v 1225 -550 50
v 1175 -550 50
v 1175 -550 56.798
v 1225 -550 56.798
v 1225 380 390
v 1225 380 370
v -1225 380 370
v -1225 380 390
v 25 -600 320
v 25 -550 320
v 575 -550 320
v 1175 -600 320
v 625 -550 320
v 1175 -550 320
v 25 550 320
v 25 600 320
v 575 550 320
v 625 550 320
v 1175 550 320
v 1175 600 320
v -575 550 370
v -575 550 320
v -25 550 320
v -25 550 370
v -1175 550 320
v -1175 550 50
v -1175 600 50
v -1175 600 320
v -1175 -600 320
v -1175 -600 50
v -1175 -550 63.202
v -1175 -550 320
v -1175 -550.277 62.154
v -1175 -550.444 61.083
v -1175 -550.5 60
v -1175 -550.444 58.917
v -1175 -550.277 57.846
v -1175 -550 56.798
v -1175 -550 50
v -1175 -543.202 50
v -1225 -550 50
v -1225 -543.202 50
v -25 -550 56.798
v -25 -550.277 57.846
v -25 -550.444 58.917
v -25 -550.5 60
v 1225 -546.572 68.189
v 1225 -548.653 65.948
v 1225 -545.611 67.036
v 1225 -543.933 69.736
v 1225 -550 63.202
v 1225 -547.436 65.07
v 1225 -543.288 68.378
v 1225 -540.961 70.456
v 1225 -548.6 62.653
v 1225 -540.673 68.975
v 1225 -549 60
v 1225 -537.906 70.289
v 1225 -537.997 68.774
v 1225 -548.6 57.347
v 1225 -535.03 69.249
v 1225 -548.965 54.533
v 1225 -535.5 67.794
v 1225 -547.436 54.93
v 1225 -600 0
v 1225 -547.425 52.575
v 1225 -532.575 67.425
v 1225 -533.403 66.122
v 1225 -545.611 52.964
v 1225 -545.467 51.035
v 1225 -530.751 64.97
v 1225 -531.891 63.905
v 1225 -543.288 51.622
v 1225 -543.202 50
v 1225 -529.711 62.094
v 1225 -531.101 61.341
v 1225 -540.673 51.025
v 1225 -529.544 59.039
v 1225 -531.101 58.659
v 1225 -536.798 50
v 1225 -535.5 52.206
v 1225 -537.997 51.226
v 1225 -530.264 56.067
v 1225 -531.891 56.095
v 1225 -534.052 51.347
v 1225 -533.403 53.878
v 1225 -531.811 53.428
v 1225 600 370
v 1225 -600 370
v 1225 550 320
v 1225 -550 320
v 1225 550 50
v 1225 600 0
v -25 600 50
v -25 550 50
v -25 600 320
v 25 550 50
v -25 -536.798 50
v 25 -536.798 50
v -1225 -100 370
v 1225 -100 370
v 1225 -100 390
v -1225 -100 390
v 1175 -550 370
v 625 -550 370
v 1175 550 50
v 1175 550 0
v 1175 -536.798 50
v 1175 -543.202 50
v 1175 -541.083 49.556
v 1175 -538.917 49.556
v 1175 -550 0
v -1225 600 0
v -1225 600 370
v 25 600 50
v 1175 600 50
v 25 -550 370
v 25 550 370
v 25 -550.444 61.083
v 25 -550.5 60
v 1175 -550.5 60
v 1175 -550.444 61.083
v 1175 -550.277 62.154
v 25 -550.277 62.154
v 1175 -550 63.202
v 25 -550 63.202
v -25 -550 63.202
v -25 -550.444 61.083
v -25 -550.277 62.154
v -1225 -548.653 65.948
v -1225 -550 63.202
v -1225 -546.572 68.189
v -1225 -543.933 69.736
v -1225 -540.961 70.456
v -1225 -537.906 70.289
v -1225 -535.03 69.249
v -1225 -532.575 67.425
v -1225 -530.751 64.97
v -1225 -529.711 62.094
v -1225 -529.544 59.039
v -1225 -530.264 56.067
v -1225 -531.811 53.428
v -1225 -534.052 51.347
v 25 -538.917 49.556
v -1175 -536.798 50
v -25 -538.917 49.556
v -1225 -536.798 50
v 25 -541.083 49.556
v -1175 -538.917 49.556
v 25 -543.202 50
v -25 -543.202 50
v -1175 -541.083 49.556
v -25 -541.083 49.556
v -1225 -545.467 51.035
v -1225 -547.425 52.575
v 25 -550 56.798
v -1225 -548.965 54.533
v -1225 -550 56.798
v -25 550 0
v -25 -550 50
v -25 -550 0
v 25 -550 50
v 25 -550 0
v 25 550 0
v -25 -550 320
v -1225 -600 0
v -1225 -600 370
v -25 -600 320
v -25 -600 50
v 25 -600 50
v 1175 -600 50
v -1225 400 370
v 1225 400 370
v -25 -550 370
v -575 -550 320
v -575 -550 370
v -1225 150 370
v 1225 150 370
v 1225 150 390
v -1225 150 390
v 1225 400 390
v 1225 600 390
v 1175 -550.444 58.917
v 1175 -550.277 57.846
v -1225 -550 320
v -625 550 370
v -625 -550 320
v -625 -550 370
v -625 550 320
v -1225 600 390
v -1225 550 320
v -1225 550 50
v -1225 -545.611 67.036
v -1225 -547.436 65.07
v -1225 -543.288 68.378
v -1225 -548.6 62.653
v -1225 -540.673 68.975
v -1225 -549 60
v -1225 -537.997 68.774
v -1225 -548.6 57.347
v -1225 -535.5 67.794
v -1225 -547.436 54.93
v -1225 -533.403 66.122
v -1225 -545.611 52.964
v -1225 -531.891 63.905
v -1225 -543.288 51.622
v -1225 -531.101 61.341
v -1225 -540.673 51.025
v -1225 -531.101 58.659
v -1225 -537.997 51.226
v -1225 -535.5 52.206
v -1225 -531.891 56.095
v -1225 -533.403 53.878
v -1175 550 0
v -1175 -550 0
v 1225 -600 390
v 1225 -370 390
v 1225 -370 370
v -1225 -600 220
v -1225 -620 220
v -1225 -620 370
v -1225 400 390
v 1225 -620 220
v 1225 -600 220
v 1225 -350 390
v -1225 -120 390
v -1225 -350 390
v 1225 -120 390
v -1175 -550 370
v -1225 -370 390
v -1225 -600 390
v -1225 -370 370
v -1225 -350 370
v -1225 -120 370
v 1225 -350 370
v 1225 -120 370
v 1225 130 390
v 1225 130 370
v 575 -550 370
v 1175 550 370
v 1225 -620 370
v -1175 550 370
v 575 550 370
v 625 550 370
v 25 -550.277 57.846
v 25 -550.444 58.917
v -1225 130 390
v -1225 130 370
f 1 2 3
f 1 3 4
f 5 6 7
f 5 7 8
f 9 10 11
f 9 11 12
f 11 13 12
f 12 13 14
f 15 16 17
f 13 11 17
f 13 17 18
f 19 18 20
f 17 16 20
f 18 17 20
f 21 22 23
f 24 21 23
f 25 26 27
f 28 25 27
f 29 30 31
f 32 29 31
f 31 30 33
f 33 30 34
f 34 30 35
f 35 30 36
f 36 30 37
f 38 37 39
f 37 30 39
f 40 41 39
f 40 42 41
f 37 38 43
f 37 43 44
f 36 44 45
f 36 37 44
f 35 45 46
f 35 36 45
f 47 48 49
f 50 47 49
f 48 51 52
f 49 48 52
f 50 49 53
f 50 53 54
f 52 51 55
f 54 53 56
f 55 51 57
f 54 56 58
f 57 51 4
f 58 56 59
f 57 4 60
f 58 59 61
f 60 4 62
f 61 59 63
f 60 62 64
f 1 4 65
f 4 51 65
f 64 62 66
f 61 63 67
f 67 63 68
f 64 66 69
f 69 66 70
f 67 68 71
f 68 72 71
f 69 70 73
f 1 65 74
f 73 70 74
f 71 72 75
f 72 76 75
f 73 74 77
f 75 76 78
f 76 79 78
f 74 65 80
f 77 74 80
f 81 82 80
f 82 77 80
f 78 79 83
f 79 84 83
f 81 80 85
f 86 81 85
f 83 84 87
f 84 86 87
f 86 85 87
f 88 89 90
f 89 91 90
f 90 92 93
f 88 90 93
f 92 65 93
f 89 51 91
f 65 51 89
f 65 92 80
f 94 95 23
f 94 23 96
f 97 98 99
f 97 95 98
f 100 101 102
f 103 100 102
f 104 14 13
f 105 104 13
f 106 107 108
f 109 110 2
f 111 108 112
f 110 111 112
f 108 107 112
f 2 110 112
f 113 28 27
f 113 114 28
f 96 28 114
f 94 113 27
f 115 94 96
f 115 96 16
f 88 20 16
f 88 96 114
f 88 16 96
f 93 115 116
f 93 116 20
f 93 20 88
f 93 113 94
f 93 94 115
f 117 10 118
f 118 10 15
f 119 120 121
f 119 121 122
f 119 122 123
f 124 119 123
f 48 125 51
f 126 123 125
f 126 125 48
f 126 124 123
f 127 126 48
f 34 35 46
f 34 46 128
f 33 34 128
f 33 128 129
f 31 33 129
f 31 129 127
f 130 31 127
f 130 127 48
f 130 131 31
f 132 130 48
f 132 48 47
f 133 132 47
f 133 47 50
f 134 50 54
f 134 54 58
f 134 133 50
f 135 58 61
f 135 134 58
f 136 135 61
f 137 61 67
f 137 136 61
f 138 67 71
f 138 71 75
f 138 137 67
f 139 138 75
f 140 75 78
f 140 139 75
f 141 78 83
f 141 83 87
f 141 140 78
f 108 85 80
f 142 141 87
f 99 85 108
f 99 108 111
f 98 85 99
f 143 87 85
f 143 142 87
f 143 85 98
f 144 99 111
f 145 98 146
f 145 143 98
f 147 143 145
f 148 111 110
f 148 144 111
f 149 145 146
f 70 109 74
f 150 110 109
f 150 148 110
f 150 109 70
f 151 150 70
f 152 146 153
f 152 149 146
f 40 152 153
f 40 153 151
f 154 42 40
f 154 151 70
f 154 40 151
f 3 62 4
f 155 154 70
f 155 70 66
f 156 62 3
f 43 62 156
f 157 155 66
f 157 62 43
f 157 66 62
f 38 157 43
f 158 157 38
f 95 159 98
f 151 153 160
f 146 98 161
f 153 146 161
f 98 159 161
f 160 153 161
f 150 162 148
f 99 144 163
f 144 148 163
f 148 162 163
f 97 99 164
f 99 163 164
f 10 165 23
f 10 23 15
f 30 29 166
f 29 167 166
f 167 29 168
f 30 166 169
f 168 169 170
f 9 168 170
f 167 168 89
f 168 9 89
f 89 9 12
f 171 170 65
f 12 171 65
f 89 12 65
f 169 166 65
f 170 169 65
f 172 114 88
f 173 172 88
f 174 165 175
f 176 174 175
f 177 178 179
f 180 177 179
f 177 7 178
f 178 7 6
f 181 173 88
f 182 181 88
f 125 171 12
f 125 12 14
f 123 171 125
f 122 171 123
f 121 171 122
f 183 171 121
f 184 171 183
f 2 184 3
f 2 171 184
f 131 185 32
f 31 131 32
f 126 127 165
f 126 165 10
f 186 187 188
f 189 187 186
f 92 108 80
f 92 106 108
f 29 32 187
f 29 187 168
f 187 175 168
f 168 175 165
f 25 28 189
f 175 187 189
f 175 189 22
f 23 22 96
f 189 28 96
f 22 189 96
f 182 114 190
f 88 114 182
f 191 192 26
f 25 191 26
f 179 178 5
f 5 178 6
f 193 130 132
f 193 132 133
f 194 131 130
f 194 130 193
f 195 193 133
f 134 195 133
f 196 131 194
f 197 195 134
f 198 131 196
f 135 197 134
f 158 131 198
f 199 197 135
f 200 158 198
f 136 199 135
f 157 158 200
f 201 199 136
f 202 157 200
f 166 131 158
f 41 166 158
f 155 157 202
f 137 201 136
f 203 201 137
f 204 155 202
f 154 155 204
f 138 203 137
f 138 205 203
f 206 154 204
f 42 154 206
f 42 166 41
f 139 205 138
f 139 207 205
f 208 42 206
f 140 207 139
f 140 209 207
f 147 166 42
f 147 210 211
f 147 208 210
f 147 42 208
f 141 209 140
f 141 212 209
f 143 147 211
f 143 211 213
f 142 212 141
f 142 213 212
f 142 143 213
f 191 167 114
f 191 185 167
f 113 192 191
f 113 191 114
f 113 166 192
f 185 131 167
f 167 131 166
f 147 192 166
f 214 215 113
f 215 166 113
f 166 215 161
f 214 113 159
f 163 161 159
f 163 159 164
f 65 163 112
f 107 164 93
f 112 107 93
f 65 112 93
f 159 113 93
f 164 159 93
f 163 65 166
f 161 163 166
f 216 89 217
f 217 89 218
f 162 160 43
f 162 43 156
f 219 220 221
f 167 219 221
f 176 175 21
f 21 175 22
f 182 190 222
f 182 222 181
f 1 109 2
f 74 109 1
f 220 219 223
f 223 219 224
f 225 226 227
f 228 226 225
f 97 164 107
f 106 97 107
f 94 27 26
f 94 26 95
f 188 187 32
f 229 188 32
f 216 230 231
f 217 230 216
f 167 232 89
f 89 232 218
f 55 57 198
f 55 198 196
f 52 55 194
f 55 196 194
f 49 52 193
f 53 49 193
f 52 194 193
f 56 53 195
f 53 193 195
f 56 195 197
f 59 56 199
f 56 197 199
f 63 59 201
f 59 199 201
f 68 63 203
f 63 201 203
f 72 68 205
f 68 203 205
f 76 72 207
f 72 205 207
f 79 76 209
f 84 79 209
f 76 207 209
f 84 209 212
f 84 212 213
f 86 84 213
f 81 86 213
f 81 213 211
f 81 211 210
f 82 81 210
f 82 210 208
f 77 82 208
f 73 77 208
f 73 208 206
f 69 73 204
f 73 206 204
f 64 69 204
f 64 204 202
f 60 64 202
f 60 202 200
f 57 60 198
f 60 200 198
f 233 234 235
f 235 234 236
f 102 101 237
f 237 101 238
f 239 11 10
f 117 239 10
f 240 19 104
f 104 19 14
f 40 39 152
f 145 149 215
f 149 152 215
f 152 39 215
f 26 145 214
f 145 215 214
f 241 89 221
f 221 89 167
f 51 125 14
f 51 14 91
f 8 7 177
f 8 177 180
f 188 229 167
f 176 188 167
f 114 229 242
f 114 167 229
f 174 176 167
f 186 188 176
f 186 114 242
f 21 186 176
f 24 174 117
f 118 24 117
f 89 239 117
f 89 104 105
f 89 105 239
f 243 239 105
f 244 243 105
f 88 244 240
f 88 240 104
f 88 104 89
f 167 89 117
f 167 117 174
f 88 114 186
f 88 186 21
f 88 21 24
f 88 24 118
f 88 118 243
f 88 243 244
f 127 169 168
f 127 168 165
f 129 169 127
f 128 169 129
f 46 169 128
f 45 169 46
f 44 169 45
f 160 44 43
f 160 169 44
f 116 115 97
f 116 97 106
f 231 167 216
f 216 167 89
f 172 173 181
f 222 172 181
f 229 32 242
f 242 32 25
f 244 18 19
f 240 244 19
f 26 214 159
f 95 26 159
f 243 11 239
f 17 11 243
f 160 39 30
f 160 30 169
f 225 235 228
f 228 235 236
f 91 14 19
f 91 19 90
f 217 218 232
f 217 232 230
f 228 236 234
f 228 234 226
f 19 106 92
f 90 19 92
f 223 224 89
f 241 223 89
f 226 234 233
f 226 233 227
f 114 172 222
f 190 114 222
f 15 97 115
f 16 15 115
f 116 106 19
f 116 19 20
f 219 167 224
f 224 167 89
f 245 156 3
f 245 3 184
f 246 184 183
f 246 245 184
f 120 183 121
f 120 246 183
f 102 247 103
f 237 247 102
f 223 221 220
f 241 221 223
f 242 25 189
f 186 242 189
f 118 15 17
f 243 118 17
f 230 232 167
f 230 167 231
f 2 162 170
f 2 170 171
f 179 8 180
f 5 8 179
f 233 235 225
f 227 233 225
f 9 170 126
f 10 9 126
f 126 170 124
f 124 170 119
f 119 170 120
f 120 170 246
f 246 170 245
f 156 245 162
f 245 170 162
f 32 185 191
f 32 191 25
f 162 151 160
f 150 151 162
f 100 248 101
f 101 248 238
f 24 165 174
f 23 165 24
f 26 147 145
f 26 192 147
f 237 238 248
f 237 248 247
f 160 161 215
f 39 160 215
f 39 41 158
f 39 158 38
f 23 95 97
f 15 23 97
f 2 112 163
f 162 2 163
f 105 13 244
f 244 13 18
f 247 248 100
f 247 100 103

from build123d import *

# Parameters (mm, degrees)
F0_W      = 50
F0_H      = 50
F0_H_2    = 1100
F1_DEPTH  = 50
F2_W      = 50
F2_H      = 50
F3_DEPTH  = 270
F4_W      = 2450
F4_H      = 1200
F4_W_2    = 25
F4_H_2    = 1100
F4_W_3    = 50
F5_DEPTH  = 50
F6_R      = 9
F7_DEPTH  = 2450
F9_DEPTH  = 20
F10_W     = 2500
F10_H     = 1200
F11_DEPTH = 20
F12_W     = 20
F12_H     = 20
F13_DEPTH = 2500
F14_W     = 50
F14_H     = 170
F15_DEPTH = 1220


with BuildPart() as f1:
    # F0 (on Top) → F1 (new body)
    with BuildSketch(Plane.XY):
        with Locations((1200, -575)):
            Rectangle(F0_W, F0_H)
        Polygon((-1175, -600), (1175, -600), (1175, -550), (25, -550), (0, -550), (-25, -550), (-1175, -550), align=None)
        with Locations((1200, 0)):
            Rectangle(F0_W, F0_H_2)
        with Locations((-1200, -575)):
            Rectangle(F0_W, F0_H)
        with Locations((1200, 575)):
            Rectangle(F0_W, F0_H)
        with Locations((-1200, 0)):
            Rectangle(F0_W, F0_H_2)
        Polygon((25, 550), (1175, 550), (1175, 600), (-1175, 600), (-1175, 550), (-25, 550), (0, 550), align=None)
        with Locations((-1200, 575)):
            Rectangle(F0_W, F0_H)
        Polygon((0, -550), (25, -550), (25, 0), (25, 550), (0, 550), (0, 0), align=None)
        Polygon((-25, 0), (-25, -550), (0, -550), (0, 0), (0, 550), (-25, 550), align=None)
    extrude(amount=F1_DEPTH)

    # F2 (on face) → F3 (join)
    with BuildSketch(Plane.XY.offset(50)):
        with Locations((0, 575)):
            Rectangle(F2_W, F2_H)
        with Locations((-1200, 575)):
            Rectangle(F2_W, F2_H)
        with Locations((-1200, -575)):
            Rectangle(F2_W, F2_H)
        with Locations((0, -575)):
            Rectangle(F2_W, F2_H)
        with Locations((1200, -575)):
            Rectangle(F2_W, F2_H)
        with Locations((1200, 575)):
            Rectangle(F2_W, F2_H)
    extrude(amount=F3_DEPTH)

    # F4 (on face) → F5 (join)
    with BuildSketch(Plane.XY.offset(320)):
        Rectangle(F4_W, F4_H)
        Polygon((1175, 550), (1175, -550), (625, -550), (600, -550), (575, -550), (25, -550), (-25, -550), (-575, -550), (-600, -550), (-625, -550), (-1175, -550), (-1175, 550), (-625, 550), (-600, 550), (-575, 550), (-25, 550), (25, 550), (575, 550), (600, 550), (625, 550), align=None, mode=Mode.SUBTRACT)
        with Locations((-587.5, 0)):
            Rectangle(F4_W_2, F4_H_2)
        with Locations((-612.5, 0)):
            Rectangle(F4_W_2, F4_H_2)
        with Locations((612.5, 0)):
            Rectangle(F4_W_2, F4_H_2)
        with Locations((587.5, 0)):
            Rectangle(F4_W_2, F4_H_2)
        Rectangle(F4_W_3, F4_H_2)
    extrude(amount=F5_DEPTH)

    # F6 (on face) → F7 (join)
    with BuildSketch(Plane(origin=(-1225, 0, 0), x_dir=(0, -1, 0), z_dir=(-1, 0, 0))):
        with Locations((540, 60)):
            Circle(F6_R)
        with BuildLine():
            ThreePointArc((550.5, 60), (529.625753, 61.620185), (550, 56.798438))
            ThreePointArc((550, 56.798438), (550.374247, 58.379815), (550.5, 60))
        make_face()
        with Locations((540, 60)):
            Circle(F6_R, mode=Mode.SUBTRACT)
    extrude(amount=-F7_DEPTH)


with BuildPart() as f9:
    # F8 (on face) → F9 (new body)
    with BuildSketch(Plane.XZ.offset(600)):
        Polygon((1225, 220), (1225, 370), (-1225, 370), (-1275, 370), (-1275, 220), align=None)
    extrude(amount=F9_DEPTH)


with BuildPart() as f11:
    # F10 (on face) → F11 (new body)
    with BuildSketch(Plane.XY.offset(370)):
        with Locations((-25, 0)):
            Rectangle(F10_W, F10_H)
    extrude(amount=F11_DEPTH)

    # F12 (on face) → F13 (cut, through all)
    with BuildSketch(Plane(origin=(-1275, 0, 0), x_dir=(0, -1, 0), z_dir=(-1, 0, 0))):
        with Locations((610, 380)):
            Rectangle(F12_W, F12_H)
        with Locations((360, 380)):
            Rectangle(F12_W, F12_H)
        with Locations((110, 380)):
            Rectangle(F12_W, F12_H)
        with Locations((-140, 380)):
            Rectangle(F12_W, F12_H)
        with Locations((-390, 380)):
            Rectangle(F12_W, F12_H)
    extrude(amount=-F13_DEPTH, mode=Mode.SUBTRACT)


with BuildPart() as f15_tool:
    # F14 (on face) → F15 (new body, through all)
    with BuildSketch(Plane.XZ.offset(620)):
        with Locations((-1250, 305)):
            Rectangle(F14_W, F14_H)
    extrude(amount=-F15_DEPTH)


with BuildPart() as f9_1:
    add(f9.part)

    # F15: cut by f15_tool
    add(f15_tool.part, mode=Mode.SUBTRACT)


with BuildPart() as f11_1:
    add(f11.part)

    # F15: cut by f15_tool
    add(f15_tool.part, mode=Mode.SUBTRACT)


solid = Compound([f1.part, f9_1.part, f11_1.part])
